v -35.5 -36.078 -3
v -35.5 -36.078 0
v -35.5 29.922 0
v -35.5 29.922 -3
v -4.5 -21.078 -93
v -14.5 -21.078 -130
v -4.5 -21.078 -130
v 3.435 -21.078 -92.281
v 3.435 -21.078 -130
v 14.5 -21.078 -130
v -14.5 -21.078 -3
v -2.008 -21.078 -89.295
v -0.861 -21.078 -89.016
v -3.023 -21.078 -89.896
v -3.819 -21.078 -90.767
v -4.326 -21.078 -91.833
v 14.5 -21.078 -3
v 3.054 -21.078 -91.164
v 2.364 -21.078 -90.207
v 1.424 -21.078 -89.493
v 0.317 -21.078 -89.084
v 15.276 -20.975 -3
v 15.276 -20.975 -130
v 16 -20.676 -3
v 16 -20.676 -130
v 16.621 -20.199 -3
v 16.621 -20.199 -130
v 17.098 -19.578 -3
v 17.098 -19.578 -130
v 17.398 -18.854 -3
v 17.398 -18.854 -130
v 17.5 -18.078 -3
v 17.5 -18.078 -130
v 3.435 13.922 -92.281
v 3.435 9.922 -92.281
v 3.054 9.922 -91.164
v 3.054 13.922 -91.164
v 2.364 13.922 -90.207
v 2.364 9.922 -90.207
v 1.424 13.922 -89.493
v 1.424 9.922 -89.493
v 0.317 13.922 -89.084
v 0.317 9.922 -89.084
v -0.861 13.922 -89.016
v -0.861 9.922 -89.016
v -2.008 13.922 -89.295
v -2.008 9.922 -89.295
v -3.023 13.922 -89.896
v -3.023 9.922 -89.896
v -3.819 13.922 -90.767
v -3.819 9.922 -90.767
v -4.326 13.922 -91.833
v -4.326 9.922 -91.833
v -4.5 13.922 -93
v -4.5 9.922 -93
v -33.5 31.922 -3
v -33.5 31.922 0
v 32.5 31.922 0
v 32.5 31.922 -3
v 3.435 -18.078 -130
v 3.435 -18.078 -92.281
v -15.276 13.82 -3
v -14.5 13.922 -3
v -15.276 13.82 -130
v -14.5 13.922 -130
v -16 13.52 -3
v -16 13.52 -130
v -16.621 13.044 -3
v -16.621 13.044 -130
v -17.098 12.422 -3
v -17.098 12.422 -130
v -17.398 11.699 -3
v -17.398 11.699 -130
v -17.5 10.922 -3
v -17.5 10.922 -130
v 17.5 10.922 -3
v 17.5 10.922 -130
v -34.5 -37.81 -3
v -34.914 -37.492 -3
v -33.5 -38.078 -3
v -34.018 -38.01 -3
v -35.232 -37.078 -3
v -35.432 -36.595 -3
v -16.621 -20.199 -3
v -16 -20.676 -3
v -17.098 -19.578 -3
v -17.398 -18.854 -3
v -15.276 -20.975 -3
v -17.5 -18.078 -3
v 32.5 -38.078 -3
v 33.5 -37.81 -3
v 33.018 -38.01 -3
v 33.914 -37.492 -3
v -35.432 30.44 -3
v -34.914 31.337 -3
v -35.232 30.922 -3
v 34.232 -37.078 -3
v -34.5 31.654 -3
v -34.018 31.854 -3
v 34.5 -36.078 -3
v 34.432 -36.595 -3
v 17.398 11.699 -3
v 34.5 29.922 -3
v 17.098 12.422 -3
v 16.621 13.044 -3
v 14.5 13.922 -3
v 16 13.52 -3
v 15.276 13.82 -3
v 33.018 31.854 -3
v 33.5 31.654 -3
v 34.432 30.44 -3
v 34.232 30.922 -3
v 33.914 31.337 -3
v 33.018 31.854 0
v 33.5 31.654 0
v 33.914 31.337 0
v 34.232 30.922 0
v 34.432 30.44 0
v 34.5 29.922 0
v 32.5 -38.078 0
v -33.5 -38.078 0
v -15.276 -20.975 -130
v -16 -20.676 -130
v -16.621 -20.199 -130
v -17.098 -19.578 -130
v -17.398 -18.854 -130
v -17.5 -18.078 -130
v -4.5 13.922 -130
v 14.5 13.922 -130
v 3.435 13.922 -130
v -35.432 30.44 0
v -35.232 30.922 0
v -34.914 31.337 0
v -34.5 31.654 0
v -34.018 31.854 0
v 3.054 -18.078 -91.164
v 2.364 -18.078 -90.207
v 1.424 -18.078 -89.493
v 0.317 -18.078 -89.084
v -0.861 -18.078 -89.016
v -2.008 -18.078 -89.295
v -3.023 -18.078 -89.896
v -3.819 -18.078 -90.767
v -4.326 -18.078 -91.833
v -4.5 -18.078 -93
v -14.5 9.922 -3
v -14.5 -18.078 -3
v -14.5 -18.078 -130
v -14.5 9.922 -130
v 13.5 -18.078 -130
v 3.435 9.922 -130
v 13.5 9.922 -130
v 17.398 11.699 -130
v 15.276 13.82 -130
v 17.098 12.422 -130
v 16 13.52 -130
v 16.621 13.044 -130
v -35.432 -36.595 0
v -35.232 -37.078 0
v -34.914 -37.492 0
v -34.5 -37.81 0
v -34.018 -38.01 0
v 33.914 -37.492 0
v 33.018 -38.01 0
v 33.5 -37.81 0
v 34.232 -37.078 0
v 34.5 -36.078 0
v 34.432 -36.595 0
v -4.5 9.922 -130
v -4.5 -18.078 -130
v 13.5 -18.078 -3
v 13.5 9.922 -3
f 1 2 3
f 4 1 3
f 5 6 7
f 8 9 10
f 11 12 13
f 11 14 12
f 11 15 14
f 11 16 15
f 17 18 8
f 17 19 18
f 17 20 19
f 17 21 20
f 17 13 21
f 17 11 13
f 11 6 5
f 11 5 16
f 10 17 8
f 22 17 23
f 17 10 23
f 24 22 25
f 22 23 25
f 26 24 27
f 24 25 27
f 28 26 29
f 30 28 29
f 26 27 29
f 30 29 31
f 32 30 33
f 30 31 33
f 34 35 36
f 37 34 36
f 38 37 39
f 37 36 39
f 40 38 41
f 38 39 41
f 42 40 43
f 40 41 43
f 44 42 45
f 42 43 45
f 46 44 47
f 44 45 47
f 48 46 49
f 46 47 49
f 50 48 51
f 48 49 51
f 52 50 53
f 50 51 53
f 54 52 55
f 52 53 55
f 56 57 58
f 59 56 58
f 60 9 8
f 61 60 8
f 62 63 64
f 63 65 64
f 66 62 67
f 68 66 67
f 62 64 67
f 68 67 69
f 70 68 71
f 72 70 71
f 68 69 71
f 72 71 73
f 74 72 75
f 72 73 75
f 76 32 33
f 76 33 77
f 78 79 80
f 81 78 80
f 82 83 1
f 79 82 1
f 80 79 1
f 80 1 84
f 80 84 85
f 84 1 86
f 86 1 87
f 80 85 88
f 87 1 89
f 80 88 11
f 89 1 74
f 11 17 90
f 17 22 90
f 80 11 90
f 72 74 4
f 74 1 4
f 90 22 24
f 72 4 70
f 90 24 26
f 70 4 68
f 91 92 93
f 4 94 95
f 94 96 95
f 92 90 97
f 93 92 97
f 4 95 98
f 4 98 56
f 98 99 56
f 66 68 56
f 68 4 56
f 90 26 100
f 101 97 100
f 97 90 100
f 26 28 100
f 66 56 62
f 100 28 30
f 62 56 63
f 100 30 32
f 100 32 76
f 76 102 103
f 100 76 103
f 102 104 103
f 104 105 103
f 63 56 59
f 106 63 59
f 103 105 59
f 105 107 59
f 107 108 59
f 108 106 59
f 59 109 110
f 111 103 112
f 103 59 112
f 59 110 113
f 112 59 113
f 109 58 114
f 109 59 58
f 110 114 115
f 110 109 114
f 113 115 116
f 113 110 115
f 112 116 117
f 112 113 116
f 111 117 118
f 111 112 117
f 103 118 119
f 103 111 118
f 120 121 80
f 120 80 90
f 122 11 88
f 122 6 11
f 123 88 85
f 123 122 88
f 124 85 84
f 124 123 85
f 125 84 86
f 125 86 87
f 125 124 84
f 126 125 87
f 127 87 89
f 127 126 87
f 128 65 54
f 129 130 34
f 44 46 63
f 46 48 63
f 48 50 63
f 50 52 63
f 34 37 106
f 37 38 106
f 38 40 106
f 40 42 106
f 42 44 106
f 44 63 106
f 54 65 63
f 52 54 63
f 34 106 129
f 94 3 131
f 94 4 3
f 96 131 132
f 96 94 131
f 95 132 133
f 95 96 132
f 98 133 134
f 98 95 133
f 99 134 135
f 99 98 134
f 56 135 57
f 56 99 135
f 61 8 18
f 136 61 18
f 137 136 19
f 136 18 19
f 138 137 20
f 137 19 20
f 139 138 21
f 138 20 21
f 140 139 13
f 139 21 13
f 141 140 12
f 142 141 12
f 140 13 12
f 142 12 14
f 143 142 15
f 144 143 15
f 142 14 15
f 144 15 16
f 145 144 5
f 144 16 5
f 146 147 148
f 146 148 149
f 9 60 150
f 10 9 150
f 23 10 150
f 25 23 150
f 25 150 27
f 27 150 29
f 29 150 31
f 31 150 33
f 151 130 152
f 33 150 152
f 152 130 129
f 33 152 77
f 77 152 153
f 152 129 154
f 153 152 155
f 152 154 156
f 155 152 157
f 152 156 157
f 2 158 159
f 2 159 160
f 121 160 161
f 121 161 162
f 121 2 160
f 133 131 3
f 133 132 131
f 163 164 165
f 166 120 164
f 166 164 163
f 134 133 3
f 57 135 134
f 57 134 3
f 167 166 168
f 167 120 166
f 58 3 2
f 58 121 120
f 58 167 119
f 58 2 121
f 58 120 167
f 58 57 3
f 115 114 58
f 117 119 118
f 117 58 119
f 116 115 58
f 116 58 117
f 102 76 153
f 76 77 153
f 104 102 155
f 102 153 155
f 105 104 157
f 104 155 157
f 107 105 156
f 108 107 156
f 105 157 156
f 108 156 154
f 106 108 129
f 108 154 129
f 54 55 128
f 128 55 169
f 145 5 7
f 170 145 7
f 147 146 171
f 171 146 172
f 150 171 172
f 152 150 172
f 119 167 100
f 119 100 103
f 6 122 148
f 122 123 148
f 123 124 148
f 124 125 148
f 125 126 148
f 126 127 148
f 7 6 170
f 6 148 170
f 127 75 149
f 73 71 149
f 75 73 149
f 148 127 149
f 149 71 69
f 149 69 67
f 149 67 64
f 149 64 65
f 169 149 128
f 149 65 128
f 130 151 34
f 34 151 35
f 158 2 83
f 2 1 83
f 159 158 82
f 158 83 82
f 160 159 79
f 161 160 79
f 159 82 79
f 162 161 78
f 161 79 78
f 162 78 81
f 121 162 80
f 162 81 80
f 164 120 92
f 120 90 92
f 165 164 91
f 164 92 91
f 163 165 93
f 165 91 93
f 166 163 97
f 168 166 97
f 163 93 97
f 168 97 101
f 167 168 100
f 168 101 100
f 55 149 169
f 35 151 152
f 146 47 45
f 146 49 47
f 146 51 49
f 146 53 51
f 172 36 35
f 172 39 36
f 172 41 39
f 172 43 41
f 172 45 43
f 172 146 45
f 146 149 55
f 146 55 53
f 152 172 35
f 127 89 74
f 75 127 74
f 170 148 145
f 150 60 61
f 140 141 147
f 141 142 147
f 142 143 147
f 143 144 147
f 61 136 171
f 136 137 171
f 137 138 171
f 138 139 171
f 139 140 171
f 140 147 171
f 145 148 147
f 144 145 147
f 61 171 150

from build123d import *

# Parameters (mm, degrees)
F0_W     = 70
F0_H     = 70
F0_W_2   = 35
F0_H_2   = 35
F0_W_3   = 28
F0_H_3   = 28
F1_DEPTH = 3
F2_DEPTH = 130
F3_R     = 2
F5_DEPTH = 35
F6_R     = 3


with BuildPart() as f1:
    # F0 (on Top) → F1 (new body)
    with BuildSketch(Plane.XY):
        with Locations((-0.5, -3.077668637)):
            Rectangle(F0_W, F0_H)
        with Locations((0, -3.577668637)):
            Rectangle(F0_W_2, F0_H_2, mode=Mode.SUBTRACT)
        with Locations((0, -3.577668637)):
            Rectangle(F0_W_2, F0_H_2)
        with Locations((-0.5, -4.077668637)):
            Rectangle(F0_W_3, F0_H_3, mode=Mode.SUBTRACT)
        with Locations((-0.5, -4.077668637)):
            Rectangle(F0_W_3, F0_H_3)
    extrude(amount=-F1_DEPTH)

    # F0 (on Top) → F2 (join)
    with BuildSketch(Plane.XY):
        with Locations((0, -3.577668637)):
            Rectangle(F0_W_2, F0_H_2)
        with Locations((-0.5, -4.077668637)):
            Rectangle(F0_W_3, F0_H_3, mode=Mode.SUBTRACT)
    extrude(amount=-F2_DEPTH)

    # F3
    f3_edges = [f1.edges().sort_by_distance(p)[0] for p in [
        (-35.5, -38.077669, -1.5),
        (34.5, -38.077669, -1.5),
        (-35.5, 31.922331, -1.5),
        (34.5, 31.922331, -1.5),
    ]]
    fillet(f3_edges, radius=F3_R)

    # F4 (on face) → F5 (cut)
    with BuildSketch(Plane.XZ.offset(21.077668637)):
        with BuildLine():
            Line((3.4348594004, -130), (-0.5, -130))
            Line((-0.5, -130), (-0.5, -163))
            ThreePointArc((-0.5, -163), (2.0616616825, -163.9278851869), (3.4348594004, -166.2810552877))
            Line((3.4348594004, -166.2810552877), (3.4348594004, -130))
        make_face()
        with BuildLine():
            ThreePointArc((-0.5, -163), (-3.3284271247, -164.1715728753), (-4.5, -167))
            ThreePointArc((-4.5, -167), (-0.8609448701, -170.9836815637), (3.4348594004, -167.7189447123))
            Line((3.4348594004, -167.7189447123), (3.4348594004, -166.2810552877))
            ThreePointArc((3.4348594004, -166.2810552877), (2.0616616825, -163.9278851869), (-0.5, -163))
        make_face()
        with BuildLine():
            Line((-0.5, -130), (-4.5, -130))
            Line((-4.5, -130), (-4.5, -167))
            ThreePointArc((-4.5, -167), (-3.3284271247, -164.1715728753), (-0.5, -163))
            Line((-0.5, -163), (-0.5, -130))
        make_face()
        with BuildLine():
            Line((-4.5, -93), (-4.5, -130))
            Line((-4.5, -130), (-0.5, -130))
            Line((-0.5, -130), (-0.5, -97))
            ThreePointArc((-0.5, -97), (-3.3284271247, -95.8284271247), (-4.5, -93))
        make_face()
        with BuildLine():
            Line((-0.5, -97), (-0.5, -130))
            Line((-0.5, -130), (3.4348594004, -130))
            Line((3.4348594004, -130), (3.4348594004, -93.7189447123))
            ThreePointArc((3.4348594004, -93.7189447123), (2.0616616825, -96.0721148131), (-0.5, -97))
        make_face()
        with BuildLine():
            ThreePointArc((3.4348594004, -92.2810552877), (-0.8609448701, -89.0163184363), (-4.5, -93))
            ThreePointArc((-4.5, -93), (-3.3284271247, -95.8284271247), (-0.5, -97))
            ThreePointArc((-0.5, -97), (2.0616616825, -96.0721148131), (3.4348594004, -93.7189447123))
            Line((3.4348594004, -93.7189447123), (3.4348594004, -92.2810552877))
        make_face()
    extrude(amount=-F5_DEPTH, mode=Mode.SUBTRACT)

    # F6
    f6_edges = [f1.edges().sort_by_distance(p)[0] for p in [
        (17.5, -21.077669, -66.5),
        (17.5, 13.922331, -66.5),
        (-17.5, -21.077669, -66.5),
        (-17.5, 13.922331, -66.5),
    ]]
    fillet(f6_edges, radius=F6_R)


solid = f1.part
